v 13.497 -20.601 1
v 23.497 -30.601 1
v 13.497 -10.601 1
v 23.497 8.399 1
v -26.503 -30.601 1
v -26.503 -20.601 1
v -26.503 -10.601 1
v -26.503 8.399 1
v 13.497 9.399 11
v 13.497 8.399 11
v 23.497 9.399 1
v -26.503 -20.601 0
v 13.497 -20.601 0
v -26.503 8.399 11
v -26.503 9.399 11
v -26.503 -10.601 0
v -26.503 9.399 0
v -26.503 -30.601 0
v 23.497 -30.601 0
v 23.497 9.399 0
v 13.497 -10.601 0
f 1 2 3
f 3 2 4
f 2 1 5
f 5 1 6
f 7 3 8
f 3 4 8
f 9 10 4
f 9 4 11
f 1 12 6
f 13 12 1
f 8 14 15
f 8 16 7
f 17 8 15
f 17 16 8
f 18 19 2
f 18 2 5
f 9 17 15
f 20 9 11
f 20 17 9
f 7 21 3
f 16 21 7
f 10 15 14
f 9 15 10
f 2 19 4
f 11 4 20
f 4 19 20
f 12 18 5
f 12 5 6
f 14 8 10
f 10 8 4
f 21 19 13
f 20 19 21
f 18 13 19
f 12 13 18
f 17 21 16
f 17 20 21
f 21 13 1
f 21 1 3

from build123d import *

# Parameters (mm, degrees)
EXTRUDE_1_DEPTH = 1
SKETCH_2_W      = 50
SKETCH_2_H      = 1
EXTRUDE_2_DEPTH = 10
CHAMFER_1_SIZE  = 10


with BuildPart() as part:
    # 草图1 → 凸台-拉伸1 (new body)
    with BuildSketch(Plane.XY):
        Polygon((23.496790028, -8.332562617), (23.496790028, -17.864815409), (23.496790028, -30.601283989), (-26.503209972, -30.601283989), (-26.503209972, -20.601283989), (13.496790028, -20.601283989), (13.496790028, -10.601283989), (-26.503209972, -10.601283989), (-26.503209972, 9.398716011), (23.496790028, 9.398716011), align=None)
    extrude(amount=EXTRUDE_1_DEPTH)

    # 草图2 → 凸台-拉伸2 (add)
    with BuildSketch(Plane.XY.offset(1)):
        with Locations((-1.503209972, 8.898716011)):
            Rectangle(SKETCH_2_W, SKETCH_2_H)
    extrude(amount=EXTRUDE_2_DEPTH)

    # 倒角1
    chamfer_1_edges = [part.edges().sort_by_distance(p)[0] for p in [
        (23.496790028, 8.898716011, 11),
    ]]
    chamfer(chamfer_1_edges, length=CHAMFER_1_SIZE)


solid = part.part
